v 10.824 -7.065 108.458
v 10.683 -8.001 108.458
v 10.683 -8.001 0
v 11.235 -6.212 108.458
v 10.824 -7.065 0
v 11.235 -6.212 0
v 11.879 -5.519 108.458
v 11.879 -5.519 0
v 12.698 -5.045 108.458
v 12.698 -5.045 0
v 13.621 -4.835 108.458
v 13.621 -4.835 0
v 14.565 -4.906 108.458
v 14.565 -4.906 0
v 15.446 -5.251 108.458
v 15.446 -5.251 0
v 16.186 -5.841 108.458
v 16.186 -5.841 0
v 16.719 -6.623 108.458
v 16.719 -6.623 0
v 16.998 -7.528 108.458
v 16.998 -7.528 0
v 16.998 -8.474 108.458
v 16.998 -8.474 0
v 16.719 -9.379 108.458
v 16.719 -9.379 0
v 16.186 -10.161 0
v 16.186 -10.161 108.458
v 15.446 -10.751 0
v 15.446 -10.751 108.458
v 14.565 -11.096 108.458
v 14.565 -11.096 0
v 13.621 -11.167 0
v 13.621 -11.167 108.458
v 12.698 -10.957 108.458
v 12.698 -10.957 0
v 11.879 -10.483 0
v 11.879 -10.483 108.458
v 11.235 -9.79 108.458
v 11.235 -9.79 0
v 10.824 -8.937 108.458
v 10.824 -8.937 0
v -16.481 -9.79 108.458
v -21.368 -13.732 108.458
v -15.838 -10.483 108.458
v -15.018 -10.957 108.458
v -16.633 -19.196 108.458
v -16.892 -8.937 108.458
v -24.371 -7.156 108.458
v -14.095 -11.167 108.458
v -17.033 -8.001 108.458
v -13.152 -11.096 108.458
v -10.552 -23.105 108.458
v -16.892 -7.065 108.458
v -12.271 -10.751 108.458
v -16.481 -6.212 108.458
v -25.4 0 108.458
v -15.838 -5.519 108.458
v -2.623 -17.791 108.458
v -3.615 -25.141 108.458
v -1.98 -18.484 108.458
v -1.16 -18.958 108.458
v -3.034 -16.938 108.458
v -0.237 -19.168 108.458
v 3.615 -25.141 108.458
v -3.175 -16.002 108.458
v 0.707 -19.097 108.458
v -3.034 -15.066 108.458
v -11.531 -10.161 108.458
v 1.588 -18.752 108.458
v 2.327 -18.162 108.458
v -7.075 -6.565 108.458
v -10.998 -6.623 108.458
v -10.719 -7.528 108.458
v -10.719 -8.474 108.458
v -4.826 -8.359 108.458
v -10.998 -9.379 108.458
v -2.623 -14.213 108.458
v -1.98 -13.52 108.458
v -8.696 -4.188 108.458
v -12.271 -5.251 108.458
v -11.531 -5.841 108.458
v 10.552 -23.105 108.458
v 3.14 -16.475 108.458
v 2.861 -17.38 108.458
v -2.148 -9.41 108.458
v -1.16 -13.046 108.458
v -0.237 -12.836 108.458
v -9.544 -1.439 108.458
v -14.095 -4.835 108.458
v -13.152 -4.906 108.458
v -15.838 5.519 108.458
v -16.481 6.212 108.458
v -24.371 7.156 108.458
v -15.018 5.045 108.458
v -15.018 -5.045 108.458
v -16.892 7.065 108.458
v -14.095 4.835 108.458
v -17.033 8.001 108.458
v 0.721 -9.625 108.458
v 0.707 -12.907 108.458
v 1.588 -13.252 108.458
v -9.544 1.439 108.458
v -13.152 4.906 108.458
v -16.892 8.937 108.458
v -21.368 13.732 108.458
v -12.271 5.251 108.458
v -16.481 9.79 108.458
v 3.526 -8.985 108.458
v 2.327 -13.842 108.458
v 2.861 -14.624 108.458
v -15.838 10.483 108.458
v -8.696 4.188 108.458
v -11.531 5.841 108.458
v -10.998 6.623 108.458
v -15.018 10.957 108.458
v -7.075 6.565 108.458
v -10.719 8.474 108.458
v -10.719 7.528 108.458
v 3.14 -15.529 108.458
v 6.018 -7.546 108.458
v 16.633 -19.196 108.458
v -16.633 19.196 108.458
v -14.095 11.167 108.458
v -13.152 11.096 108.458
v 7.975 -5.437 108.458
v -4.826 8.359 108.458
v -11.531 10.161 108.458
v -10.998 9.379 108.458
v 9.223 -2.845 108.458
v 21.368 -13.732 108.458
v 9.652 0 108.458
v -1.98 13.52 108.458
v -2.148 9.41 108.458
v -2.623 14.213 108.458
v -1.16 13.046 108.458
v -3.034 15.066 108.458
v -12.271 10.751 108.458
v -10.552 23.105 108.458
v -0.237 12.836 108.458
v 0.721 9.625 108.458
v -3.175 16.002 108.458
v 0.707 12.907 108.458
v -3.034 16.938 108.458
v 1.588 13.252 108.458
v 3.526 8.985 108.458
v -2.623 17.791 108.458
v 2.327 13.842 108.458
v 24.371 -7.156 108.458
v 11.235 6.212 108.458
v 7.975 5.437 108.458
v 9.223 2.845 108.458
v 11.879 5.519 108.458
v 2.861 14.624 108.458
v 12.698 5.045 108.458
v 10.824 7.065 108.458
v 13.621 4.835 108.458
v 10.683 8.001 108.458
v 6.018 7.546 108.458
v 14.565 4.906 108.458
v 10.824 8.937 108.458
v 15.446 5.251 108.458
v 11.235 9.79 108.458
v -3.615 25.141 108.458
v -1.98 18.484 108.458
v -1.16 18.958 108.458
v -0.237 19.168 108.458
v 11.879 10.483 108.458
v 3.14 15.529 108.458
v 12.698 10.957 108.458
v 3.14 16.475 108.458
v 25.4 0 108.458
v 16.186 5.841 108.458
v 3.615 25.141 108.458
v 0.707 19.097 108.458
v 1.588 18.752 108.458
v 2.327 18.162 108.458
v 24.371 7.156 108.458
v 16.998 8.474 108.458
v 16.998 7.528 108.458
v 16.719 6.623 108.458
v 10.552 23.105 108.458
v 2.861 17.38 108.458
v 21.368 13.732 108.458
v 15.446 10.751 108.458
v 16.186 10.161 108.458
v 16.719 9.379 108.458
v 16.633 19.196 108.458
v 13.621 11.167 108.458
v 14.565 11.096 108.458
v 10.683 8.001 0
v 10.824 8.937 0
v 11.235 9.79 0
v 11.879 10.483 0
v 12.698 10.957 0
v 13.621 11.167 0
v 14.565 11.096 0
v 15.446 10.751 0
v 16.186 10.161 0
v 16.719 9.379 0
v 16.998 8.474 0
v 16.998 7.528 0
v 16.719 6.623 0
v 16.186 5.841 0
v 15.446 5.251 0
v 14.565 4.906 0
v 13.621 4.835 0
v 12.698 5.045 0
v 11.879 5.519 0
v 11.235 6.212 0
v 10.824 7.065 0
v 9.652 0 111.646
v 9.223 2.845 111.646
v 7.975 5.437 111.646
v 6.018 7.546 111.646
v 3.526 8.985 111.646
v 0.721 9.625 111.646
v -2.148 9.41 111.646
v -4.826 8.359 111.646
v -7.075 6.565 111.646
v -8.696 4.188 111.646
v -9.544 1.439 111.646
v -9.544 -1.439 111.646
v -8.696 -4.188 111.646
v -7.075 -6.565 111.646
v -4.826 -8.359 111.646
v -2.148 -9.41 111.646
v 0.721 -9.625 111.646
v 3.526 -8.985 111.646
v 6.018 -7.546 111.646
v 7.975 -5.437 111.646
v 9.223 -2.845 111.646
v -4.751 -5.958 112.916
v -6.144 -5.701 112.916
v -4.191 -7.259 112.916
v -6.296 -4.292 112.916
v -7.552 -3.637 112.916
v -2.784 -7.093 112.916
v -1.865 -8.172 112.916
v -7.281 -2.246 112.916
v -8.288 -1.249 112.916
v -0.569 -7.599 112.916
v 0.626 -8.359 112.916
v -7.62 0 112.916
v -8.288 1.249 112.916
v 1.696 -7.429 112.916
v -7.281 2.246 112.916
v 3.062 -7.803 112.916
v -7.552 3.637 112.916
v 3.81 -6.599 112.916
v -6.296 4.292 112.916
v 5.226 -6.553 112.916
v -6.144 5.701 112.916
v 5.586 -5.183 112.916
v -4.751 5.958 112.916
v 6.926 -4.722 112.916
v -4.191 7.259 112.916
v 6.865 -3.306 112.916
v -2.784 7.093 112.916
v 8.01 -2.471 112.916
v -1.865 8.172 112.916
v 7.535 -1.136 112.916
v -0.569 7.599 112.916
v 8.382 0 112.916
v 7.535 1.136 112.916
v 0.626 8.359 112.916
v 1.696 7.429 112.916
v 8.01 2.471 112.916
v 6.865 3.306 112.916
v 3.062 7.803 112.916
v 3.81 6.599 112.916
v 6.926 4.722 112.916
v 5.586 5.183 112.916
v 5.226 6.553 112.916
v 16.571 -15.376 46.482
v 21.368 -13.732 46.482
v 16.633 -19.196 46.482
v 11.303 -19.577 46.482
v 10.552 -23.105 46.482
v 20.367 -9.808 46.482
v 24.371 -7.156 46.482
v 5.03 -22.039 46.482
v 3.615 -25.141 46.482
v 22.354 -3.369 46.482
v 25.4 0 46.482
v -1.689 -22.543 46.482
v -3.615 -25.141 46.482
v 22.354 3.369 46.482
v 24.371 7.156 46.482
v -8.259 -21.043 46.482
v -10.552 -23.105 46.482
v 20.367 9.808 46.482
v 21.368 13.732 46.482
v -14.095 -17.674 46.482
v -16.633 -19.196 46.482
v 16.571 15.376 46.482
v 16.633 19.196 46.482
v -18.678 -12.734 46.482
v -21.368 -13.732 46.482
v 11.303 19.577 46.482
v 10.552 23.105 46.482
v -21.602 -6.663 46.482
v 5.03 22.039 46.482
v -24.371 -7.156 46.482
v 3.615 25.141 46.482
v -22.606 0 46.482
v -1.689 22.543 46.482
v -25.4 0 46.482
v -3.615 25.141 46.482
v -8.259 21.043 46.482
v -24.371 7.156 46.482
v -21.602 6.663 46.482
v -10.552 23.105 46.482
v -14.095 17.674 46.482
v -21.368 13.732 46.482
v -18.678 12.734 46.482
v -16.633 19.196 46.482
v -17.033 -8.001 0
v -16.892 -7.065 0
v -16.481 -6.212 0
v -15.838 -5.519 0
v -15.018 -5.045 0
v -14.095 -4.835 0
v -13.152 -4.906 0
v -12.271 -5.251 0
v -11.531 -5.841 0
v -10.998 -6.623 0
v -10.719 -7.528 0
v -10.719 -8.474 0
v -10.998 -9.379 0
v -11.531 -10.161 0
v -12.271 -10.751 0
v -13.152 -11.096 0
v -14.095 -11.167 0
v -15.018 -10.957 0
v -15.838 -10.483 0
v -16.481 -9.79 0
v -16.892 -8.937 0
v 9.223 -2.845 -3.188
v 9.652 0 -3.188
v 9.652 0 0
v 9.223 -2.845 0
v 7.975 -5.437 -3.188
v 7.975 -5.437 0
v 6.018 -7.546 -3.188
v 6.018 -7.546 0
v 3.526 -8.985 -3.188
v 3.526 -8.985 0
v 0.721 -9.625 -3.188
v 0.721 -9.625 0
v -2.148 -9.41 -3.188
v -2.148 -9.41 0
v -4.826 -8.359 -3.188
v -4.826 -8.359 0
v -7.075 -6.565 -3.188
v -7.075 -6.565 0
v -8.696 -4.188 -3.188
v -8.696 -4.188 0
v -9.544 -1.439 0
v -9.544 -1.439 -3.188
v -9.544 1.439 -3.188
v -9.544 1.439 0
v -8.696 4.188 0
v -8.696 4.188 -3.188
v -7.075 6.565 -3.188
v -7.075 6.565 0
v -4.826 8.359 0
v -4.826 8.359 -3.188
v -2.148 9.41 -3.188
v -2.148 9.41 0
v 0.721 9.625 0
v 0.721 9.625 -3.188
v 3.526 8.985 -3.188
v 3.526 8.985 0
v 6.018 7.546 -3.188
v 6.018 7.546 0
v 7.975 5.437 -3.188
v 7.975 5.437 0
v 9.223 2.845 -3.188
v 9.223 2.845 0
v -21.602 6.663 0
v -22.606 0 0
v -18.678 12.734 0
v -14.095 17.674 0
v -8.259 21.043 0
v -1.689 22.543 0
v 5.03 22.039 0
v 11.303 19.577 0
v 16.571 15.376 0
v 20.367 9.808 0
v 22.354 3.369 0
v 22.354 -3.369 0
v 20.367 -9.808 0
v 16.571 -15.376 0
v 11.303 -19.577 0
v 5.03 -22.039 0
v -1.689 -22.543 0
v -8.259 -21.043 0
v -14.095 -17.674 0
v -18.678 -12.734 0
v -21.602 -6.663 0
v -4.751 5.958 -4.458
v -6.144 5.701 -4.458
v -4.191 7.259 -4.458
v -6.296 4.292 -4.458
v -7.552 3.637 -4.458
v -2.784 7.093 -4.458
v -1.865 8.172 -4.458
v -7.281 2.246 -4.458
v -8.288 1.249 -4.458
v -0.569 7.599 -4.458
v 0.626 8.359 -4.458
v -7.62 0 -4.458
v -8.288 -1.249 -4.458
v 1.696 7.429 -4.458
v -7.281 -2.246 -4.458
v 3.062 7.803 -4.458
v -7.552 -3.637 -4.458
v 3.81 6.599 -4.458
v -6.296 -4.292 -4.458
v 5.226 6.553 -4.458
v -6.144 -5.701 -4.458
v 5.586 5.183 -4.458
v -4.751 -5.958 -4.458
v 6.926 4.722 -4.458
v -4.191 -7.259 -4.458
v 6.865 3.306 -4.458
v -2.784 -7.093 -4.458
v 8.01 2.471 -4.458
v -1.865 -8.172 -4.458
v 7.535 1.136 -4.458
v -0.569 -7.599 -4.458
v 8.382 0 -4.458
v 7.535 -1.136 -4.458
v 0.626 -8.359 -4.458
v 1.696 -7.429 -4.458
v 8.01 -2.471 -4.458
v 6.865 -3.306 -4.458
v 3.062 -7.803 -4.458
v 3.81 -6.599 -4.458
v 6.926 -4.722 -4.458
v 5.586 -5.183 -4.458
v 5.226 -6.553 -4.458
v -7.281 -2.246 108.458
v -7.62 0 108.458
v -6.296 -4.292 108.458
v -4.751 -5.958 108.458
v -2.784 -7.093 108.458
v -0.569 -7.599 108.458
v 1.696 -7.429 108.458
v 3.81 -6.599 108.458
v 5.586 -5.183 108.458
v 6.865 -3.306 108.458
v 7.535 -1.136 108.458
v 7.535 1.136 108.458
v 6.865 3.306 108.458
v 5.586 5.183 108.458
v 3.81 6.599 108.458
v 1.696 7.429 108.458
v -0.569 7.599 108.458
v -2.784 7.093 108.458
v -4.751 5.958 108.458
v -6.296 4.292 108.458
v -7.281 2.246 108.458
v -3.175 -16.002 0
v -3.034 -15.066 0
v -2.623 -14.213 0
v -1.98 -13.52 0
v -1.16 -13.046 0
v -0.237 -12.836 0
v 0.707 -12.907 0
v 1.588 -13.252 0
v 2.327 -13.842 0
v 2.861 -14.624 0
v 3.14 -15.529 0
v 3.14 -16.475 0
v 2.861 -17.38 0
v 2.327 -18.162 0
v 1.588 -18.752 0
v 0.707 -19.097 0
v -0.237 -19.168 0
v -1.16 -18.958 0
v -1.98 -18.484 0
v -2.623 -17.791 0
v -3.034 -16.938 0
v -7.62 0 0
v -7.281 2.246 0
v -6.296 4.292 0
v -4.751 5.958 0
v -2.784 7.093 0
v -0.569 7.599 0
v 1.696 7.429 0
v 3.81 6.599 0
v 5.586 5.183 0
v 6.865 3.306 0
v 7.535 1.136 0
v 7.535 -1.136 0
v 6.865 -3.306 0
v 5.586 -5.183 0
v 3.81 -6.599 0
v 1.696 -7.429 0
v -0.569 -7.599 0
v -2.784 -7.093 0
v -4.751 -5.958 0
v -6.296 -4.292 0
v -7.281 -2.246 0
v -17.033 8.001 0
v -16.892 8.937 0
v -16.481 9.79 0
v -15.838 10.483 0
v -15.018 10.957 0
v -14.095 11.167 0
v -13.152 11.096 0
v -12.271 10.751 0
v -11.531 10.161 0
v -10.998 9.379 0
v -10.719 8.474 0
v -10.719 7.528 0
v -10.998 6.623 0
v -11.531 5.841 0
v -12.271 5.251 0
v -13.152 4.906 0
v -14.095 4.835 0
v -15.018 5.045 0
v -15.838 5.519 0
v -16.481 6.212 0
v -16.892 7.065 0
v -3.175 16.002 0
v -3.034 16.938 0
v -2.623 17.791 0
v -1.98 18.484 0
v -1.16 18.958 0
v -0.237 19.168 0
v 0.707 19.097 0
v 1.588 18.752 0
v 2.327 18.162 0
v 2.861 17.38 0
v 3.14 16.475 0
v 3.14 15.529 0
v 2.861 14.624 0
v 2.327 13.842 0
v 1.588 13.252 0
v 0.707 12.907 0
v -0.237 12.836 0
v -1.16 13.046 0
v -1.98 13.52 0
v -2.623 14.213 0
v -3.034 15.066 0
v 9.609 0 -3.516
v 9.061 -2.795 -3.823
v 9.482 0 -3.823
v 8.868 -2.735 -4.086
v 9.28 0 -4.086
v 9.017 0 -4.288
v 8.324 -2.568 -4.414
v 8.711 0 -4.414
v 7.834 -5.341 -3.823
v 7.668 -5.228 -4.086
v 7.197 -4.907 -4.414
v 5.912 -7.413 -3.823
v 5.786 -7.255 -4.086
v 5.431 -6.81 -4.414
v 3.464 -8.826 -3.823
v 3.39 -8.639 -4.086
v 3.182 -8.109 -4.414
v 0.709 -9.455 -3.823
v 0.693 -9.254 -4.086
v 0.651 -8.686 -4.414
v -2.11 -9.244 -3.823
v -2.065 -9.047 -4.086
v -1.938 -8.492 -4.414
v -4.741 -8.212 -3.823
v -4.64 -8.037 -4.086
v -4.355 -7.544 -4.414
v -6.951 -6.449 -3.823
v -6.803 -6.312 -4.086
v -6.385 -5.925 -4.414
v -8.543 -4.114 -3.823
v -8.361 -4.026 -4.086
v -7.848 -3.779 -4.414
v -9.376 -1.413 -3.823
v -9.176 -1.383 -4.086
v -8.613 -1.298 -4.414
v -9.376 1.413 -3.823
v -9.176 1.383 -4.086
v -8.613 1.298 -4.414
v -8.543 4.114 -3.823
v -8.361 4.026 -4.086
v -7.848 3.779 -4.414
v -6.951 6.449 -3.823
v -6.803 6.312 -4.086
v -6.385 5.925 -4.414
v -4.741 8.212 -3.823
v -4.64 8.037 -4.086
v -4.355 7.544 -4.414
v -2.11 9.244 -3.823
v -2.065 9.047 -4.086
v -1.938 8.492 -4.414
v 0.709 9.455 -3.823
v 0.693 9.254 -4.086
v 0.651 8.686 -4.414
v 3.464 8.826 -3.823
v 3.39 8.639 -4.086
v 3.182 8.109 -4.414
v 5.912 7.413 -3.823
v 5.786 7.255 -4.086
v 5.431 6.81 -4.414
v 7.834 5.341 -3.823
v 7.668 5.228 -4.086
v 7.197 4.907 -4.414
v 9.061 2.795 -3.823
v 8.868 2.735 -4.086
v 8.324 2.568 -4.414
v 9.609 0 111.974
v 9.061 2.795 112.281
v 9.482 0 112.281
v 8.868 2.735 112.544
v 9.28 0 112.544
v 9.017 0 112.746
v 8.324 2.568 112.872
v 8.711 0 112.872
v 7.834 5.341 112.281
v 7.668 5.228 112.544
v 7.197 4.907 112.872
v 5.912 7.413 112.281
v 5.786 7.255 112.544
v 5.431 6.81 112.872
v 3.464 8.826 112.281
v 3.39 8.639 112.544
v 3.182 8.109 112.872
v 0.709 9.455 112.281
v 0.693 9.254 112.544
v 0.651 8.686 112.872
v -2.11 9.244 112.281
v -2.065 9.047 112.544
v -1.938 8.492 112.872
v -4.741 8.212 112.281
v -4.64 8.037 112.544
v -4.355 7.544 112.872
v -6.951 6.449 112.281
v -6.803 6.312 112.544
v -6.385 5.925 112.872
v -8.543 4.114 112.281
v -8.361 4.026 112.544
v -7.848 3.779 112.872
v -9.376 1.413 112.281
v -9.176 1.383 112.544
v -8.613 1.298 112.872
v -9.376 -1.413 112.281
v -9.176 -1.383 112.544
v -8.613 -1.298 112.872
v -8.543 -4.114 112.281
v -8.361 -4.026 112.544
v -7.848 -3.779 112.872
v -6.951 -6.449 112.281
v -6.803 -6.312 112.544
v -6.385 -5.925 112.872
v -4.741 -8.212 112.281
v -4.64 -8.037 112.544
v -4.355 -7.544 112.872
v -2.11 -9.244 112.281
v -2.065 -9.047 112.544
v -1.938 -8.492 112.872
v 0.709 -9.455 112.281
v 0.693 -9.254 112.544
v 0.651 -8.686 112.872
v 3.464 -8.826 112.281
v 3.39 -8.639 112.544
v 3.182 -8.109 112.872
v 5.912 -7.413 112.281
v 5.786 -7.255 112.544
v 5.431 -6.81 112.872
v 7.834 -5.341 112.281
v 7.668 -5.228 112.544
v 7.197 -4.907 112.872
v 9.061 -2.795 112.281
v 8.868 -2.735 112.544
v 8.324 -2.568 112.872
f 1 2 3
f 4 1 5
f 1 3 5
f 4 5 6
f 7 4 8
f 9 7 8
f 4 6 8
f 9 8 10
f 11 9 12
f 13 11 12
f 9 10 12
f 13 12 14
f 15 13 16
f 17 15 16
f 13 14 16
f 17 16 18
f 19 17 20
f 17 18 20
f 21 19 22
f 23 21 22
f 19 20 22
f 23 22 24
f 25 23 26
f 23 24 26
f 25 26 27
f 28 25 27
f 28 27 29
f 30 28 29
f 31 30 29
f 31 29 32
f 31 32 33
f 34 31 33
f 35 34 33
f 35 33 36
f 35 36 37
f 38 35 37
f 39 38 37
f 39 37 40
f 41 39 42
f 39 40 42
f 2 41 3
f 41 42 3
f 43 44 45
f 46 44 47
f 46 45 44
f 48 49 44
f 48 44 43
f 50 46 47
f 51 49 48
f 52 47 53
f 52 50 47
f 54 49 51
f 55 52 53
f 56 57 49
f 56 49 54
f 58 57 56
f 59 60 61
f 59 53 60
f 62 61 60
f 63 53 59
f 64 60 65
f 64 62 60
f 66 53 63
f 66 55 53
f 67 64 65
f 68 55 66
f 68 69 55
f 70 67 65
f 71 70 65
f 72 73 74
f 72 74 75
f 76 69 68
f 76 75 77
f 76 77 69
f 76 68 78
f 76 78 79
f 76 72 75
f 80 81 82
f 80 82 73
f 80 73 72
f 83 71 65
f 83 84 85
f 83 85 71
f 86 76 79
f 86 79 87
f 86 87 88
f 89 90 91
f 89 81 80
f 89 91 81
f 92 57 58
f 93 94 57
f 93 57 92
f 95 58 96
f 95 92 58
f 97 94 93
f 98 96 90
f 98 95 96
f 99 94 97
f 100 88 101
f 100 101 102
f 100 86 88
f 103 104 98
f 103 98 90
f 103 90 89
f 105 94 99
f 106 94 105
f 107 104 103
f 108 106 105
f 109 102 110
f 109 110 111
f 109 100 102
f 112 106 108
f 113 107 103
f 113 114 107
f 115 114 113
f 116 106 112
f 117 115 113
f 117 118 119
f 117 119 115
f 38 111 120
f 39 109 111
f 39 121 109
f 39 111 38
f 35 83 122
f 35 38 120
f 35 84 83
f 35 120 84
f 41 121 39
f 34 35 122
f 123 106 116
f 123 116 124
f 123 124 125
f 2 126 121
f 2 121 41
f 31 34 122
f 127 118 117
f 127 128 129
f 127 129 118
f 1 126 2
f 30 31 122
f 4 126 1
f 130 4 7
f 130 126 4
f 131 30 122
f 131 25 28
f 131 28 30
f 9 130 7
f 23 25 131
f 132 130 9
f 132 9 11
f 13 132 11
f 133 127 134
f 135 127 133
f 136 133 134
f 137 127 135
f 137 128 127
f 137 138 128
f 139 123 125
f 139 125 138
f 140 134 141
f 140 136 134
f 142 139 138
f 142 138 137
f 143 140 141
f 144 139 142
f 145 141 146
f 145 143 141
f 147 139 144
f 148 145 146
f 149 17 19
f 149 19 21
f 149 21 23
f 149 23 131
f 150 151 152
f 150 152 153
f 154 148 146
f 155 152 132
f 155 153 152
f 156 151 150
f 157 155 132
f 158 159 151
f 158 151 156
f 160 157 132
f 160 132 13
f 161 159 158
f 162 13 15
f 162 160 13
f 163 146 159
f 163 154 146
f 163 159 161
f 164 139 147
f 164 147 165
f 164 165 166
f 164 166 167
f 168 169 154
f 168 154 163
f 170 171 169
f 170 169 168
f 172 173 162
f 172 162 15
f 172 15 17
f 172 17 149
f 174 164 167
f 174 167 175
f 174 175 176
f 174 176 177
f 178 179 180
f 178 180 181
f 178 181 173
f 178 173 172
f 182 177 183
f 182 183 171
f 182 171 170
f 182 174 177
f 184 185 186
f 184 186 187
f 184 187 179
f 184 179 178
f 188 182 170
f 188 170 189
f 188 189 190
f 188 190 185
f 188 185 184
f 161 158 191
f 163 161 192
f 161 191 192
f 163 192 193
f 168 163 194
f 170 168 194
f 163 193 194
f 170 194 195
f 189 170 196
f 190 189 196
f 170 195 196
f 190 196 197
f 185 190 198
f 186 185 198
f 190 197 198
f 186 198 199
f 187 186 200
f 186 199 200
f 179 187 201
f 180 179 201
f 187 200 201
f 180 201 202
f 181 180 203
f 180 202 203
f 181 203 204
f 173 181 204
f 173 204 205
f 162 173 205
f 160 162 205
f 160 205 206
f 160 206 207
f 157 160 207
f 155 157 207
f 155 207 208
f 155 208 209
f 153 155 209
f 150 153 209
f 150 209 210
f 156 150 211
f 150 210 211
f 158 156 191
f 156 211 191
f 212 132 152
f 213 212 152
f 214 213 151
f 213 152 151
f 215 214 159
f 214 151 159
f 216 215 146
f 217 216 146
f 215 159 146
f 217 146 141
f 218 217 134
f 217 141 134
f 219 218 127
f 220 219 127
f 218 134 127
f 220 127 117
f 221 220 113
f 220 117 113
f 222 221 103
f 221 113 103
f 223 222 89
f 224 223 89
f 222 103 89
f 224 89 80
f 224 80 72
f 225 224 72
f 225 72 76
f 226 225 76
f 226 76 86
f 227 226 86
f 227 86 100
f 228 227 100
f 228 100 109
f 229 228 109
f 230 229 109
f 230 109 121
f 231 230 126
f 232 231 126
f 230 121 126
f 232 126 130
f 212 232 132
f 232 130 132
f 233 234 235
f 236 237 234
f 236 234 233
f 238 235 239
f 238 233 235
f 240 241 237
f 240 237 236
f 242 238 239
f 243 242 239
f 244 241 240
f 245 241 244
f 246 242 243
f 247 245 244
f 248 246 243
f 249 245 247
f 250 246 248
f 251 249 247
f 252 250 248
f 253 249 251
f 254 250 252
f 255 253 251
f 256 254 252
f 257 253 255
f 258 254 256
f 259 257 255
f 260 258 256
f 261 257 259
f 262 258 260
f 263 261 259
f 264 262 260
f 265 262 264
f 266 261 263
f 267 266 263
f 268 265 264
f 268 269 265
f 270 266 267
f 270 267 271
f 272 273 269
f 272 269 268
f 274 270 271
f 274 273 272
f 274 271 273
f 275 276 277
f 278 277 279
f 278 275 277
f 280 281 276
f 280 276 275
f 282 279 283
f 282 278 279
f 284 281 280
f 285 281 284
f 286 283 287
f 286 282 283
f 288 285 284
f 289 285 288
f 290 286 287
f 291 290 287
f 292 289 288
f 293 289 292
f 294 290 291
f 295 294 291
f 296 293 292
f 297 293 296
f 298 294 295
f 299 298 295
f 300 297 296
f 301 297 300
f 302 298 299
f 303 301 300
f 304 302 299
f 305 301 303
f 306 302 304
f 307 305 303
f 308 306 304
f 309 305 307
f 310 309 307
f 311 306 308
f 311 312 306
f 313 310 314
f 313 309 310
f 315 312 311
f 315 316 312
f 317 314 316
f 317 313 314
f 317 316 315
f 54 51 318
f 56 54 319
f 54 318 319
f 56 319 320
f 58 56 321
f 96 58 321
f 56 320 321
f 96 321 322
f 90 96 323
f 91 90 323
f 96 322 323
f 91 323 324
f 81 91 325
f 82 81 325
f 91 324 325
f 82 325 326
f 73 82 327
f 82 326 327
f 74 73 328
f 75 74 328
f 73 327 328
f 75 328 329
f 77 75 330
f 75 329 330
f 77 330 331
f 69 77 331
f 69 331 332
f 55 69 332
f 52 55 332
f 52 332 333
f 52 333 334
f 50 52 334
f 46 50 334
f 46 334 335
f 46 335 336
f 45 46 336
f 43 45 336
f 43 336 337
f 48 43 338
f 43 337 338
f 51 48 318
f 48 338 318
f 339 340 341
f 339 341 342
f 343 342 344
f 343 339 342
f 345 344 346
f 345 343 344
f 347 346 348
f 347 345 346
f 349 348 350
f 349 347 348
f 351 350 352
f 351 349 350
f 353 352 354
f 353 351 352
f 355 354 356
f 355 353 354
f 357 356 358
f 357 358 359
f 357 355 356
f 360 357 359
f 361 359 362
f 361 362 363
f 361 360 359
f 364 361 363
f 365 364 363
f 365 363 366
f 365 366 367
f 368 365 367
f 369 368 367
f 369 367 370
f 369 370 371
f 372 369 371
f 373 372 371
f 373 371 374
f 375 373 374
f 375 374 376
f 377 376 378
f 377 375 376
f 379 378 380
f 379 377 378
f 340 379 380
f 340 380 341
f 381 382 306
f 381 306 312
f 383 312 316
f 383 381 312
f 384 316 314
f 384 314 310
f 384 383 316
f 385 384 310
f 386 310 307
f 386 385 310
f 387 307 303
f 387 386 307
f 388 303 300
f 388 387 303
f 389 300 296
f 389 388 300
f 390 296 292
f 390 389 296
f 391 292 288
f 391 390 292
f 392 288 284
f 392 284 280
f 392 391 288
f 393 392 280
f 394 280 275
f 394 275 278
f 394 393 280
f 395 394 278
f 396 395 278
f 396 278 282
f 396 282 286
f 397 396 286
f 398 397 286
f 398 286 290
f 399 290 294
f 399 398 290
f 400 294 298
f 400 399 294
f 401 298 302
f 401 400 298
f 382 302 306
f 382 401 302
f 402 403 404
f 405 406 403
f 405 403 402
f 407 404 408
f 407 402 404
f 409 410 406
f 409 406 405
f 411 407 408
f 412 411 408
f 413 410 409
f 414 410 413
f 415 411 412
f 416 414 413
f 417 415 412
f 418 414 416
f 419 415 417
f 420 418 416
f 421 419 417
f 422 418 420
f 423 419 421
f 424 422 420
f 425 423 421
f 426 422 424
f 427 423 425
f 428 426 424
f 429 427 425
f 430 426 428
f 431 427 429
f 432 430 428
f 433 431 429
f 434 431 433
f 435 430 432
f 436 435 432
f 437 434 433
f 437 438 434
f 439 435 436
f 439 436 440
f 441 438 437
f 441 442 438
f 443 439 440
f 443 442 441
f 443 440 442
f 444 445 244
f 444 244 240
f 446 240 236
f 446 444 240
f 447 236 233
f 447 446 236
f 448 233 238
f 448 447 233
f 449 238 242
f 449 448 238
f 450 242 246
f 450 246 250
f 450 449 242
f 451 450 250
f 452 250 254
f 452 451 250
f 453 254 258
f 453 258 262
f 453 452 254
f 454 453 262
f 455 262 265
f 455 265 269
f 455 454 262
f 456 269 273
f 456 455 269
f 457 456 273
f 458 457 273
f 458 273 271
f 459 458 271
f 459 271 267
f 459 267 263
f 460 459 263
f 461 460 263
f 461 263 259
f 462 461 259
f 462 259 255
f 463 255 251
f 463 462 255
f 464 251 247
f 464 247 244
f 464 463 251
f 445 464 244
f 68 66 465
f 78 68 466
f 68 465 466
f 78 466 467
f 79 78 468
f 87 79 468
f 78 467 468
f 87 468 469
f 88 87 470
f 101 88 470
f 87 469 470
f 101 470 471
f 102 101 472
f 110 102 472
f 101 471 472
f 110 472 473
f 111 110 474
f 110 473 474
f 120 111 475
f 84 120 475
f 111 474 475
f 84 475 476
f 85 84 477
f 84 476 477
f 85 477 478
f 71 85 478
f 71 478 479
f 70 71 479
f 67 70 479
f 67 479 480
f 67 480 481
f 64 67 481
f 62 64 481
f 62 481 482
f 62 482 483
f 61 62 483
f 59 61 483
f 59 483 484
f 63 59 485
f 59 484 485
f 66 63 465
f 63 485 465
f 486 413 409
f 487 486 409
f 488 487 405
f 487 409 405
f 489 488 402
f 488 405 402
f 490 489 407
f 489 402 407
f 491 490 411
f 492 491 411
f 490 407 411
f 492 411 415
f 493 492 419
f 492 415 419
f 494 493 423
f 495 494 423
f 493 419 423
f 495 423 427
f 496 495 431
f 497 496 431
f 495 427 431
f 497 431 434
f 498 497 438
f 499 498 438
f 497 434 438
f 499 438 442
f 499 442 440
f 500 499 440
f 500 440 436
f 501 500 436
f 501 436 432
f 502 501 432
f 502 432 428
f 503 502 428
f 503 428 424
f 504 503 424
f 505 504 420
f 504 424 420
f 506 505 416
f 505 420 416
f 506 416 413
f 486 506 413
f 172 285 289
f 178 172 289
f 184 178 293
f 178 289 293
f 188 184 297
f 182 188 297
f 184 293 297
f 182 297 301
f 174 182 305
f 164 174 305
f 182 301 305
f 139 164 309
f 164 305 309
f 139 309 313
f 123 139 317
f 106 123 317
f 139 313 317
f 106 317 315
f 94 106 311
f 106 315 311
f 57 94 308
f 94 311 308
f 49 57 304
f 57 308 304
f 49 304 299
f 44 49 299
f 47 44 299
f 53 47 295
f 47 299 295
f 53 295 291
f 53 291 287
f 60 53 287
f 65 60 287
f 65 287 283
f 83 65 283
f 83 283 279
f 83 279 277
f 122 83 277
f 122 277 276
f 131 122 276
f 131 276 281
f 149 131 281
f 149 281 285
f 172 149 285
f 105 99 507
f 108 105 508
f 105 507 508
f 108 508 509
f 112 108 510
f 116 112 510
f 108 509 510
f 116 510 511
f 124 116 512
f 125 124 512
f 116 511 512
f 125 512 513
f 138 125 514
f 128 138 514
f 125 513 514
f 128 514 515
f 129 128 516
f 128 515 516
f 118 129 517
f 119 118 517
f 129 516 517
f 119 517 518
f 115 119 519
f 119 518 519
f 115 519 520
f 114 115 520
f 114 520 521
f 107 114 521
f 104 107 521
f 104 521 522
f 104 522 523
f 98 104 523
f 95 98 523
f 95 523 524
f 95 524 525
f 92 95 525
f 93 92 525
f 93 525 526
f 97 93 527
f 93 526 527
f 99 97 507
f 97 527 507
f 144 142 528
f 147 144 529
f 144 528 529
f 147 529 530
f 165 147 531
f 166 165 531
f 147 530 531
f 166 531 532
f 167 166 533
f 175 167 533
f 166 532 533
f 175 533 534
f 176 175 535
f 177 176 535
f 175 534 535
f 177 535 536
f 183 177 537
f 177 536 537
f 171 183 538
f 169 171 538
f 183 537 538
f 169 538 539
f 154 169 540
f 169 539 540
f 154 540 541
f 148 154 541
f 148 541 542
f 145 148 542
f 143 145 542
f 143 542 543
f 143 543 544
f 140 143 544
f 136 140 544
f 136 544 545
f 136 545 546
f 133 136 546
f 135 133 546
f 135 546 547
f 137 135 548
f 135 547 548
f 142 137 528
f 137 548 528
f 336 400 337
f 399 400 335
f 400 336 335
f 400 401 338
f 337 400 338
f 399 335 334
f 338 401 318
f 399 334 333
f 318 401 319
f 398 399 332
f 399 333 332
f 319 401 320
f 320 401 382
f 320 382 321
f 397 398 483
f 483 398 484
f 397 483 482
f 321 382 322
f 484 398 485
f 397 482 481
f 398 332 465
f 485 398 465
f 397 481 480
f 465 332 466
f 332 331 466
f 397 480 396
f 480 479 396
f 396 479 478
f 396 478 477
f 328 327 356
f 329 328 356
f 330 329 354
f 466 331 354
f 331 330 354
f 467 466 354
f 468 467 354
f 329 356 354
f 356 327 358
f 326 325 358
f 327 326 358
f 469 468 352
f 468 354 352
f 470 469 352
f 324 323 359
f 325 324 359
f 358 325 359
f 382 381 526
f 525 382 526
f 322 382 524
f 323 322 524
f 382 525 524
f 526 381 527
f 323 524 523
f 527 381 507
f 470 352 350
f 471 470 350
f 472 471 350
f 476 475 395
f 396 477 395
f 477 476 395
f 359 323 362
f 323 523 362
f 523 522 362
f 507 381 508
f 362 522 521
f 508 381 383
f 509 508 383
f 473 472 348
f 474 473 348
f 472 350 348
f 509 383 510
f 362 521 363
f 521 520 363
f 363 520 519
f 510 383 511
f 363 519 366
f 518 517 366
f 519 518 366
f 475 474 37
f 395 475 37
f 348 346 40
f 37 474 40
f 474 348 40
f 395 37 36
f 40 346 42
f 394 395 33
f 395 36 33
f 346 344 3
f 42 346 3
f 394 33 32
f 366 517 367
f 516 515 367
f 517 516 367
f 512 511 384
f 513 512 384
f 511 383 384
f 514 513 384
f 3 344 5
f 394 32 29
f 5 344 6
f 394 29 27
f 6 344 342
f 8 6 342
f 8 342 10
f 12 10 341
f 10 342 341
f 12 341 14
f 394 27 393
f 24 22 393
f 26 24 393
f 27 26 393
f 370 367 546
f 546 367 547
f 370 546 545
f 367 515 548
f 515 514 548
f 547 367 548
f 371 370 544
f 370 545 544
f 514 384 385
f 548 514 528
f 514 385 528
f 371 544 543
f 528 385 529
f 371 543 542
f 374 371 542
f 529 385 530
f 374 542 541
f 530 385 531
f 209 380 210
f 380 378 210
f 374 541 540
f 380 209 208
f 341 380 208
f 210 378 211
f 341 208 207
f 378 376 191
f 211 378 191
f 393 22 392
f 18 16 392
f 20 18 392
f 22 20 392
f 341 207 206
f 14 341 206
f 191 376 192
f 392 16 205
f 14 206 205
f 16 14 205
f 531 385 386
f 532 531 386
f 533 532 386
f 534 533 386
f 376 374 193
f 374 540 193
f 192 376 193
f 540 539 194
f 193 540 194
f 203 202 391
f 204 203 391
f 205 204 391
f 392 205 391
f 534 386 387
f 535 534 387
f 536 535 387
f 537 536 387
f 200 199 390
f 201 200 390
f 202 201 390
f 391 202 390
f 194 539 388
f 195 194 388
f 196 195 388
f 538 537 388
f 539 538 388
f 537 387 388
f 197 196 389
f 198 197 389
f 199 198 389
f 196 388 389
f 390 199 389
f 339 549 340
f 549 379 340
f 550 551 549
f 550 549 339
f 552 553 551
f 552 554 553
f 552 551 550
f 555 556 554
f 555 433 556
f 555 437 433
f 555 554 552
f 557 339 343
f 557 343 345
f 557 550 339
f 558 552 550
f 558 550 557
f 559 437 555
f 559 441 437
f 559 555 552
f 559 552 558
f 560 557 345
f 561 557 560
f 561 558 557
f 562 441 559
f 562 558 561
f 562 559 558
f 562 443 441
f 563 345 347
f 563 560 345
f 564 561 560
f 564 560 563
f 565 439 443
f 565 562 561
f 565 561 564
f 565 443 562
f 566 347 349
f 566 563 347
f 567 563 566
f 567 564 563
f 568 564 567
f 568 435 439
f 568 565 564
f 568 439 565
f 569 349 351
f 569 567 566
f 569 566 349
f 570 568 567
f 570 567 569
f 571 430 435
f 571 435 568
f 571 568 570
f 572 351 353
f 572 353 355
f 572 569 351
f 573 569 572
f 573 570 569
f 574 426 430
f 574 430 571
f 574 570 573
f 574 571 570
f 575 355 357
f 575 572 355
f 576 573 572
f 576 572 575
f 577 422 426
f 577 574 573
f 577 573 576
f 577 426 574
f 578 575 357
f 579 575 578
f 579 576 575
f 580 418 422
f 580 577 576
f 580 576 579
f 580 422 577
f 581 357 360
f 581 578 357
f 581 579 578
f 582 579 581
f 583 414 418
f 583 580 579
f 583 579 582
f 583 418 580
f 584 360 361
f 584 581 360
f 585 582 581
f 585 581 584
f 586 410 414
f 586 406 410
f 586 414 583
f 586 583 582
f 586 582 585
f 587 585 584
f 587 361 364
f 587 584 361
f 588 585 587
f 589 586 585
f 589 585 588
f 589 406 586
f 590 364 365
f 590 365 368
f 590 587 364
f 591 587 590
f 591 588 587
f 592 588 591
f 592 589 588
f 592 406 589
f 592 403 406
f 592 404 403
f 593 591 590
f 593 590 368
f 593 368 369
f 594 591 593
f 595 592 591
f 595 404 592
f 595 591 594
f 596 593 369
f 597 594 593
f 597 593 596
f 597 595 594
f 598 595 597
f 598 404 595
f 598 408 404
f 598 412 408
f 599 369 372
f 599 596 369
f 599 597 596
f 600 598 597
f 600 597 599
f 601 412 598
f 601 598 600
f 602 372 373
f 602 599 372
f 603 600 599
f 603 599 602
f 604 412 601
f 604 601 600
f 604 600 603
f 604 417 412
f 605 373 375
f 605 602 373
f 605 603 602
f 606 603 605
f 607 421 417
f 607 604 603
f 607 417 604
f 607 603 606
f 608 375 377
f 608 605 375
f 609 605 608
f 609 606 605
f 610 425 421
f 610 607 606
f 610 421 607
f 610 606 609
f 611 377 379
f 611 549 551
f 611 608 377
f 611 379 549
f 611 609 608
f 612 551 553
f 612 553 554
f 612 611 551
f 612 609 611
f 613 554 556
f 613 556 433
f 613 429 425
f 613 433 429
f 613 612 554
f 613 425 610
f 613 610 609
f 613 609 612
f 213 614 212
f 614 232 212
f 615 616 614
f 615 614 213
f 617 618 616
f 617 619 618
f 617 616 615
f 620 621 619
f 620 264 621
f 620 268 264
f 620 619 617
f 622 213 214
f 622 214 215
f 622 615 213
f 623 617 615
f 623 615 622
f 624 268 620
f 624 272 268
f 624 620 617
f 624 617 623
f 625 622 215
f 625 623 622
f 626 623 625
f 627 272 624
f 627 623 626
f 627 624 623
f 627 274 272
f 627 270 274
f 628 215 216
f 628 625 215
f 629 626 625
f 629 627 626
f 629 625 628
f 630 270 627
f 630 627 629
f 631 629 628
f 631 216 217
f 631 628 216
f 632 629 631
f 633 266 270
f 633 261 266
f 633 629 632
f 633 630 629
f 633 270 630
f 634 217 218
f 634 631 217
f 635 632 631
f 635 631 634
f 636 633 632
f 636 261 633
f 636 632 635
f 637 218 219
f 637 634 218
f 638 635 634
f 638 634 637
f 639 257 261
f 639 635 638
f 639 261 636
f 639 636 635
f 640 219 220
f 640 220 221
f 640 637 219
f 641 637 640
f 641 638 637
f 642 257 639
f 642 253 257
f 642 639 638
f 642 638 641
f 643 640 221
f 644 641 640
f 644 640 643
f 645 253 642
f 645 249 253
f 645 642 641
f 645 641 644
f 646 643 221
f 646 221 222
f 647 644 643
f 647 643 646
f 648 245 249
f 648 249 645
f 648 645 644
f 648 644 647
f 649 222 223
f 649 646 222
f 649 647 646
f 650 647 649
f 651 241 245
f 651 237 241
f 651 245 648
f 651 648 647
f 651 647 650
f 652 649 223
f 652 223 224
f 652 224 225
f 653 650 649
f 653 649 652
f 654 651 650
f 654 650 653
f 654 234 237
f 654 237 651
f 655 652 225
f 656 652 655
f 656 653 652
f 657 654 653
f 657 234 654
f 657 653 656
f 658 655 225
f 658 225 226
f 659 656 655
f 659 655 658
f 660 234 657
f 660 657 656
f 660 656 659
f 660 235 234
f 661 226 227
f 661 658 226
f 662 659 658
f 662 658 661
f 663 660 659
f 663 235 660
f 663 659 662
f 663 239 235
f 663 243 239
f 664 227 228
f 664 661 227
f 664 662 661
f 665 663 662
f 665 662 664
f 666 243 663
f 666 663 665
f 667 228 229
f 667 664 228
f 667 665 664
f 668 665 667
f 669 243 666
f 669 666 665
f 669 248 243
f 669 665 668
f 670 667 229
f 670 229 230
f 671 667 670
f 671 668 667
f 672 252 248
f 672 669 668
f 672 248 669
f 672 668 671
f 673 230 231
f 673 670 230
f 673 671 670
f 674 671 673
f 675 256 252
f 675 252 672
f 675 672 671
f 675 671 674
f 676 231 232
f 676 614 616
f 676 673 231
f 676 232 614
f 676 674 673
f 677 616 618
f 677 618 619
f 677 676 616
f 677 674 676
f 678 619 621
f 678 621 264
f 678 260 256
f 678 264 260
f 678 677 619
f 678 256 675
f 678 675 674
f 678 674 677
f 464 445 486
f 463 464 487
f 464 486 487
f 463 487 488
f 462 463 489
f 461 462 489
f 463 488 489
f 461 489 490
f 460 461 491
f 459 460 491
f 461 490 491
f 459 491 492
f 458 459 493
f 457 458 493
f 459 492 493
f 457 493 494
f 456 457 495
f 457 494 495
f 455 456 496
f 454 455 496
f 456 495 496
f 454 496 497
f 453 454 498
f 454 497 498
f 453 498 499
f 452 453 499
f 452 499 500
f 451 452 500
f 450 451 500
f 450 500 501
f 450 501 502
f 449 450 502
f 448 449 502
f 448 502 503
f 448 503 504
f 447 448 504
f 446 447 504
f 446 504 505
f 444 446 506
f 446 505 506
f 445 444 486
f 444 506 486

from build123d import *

# Parameters (mm, degrees)
SKETCH1_R           = 25.4
BOSS_EXTRUDE2_DEPTH = 108.458
SKETCH6_R           = 7.62
SKETCH6_R_2         = 3.175
CUT_EXTRUDE1_DEPTH  = 108.458
SKETCH7_R           = 25.4
SKETCH7_R_2         = 22.606
CUT_EXTRUDE2_DEPTH  = 46.482
SKETCH8_R           = 9.652
SKETCH8_R_2         = 7.62
BOSS_EXTRUDE7_DEPTH = 4.4577
BOSS_EXTRUDE8_START = 4.4577
SKETCH9_R           = 9.652
SKETCH9_R_2         = 7.62
BOSS_EXTRUDE8_DEPTH = 4.4577
FILLET1_R           = 1.27


with BuildPart() as part:
    # Sketch1 → Boss-Extrude2 (new body)
    with BuildSketch(Plane.XY):
        Circle(SKETCH1_R)
    extrude(amount=BOSS_EXTRUDE2_DEPTH)

    # Sketch6 → Cut-Extrude1 (cut)
    with BuildSketch(Plane(origin=(0, 0, 0), x_dir=(-1, 0, 0), z_dir=(0, 0, -1))):
        Circle(SKETCH6_R)
        with Locations((-13.858138511, 8.001)):
            Circle(SKETCH6_R_2)
        with Locations((0, 16.002)):
            Circle(SKETCH6_R_2)
        with Locations((13.858138511, 8.001)):
            Circle(SKETCH6_R_2)
        with Locations((13.858138511, -8.001)):
            Circle(SKETCH6_R_2)
        with Locations((0, -16.002)):
            Circle(SKETCH6_R_2)
        with Locations((-13.858138511, -8.001)):
            Circle(SKETCH6_R_2)
    extrude(amount=-CUT_EXTRUDE1_DEPTH, mode=Mode.SUBTRACT)

    # Sketch7 → Cut-Extrude2 (cut)
    with BuildSketch(Plane(origin=(0, 0, 0), x_dir=(-1, 0, 0), z_dir=(0, 0, -1))):
        Circle(SKETCH7_R)
        Circle(SKETCH7_R_2, mode=Mode.SUBTRACT)
    extrude(amount=-CUT_EXTRUDE2_DEPTH, mode=Mode.SUBTRACT)

    # Sketch8 → Boss-Extrude7 (add)
    with BuildSketch(Plane.XY.offset(108.458)):
        Circle(SKETCH8_R)
        with Locations(Location((0, 0, 0), (0, 0, 180))):
            Circle(SKETCH8_R_2, mode=Mode.SUBTRACT)
    extrude(amount=BOSS_EXTRUDE7_DEPTH)

    # Sketch9 → Boss-Extrude8 (add)
    with BuildSketch(Plane(origin=(0, 0, 0), x_dir=(-1, 0, 0), z_dir=(0, 0, -1)).offset(BOSS_EXTRUDE8_START)):
        with Locations(Location((0, 0, 0), (0, 0, 180))):
            Circle(SKETCH9_R)
        Circle(SKETCH9_R_2, mode=Mode.SUBTRACT)
    extrude(amount=-BOSS_EXTRUDE8_DEPTH)

    # Fillet1
    fillet1_edges = [part.edges().sort_by_distance(p)[0] for p in [
        (-9.652, 0, 112.9157),
        (-9.652, 0, -4.4577),
    ]]
    fillet(fillet1_edges, radius=FILLET1_R)


solid = part.part
